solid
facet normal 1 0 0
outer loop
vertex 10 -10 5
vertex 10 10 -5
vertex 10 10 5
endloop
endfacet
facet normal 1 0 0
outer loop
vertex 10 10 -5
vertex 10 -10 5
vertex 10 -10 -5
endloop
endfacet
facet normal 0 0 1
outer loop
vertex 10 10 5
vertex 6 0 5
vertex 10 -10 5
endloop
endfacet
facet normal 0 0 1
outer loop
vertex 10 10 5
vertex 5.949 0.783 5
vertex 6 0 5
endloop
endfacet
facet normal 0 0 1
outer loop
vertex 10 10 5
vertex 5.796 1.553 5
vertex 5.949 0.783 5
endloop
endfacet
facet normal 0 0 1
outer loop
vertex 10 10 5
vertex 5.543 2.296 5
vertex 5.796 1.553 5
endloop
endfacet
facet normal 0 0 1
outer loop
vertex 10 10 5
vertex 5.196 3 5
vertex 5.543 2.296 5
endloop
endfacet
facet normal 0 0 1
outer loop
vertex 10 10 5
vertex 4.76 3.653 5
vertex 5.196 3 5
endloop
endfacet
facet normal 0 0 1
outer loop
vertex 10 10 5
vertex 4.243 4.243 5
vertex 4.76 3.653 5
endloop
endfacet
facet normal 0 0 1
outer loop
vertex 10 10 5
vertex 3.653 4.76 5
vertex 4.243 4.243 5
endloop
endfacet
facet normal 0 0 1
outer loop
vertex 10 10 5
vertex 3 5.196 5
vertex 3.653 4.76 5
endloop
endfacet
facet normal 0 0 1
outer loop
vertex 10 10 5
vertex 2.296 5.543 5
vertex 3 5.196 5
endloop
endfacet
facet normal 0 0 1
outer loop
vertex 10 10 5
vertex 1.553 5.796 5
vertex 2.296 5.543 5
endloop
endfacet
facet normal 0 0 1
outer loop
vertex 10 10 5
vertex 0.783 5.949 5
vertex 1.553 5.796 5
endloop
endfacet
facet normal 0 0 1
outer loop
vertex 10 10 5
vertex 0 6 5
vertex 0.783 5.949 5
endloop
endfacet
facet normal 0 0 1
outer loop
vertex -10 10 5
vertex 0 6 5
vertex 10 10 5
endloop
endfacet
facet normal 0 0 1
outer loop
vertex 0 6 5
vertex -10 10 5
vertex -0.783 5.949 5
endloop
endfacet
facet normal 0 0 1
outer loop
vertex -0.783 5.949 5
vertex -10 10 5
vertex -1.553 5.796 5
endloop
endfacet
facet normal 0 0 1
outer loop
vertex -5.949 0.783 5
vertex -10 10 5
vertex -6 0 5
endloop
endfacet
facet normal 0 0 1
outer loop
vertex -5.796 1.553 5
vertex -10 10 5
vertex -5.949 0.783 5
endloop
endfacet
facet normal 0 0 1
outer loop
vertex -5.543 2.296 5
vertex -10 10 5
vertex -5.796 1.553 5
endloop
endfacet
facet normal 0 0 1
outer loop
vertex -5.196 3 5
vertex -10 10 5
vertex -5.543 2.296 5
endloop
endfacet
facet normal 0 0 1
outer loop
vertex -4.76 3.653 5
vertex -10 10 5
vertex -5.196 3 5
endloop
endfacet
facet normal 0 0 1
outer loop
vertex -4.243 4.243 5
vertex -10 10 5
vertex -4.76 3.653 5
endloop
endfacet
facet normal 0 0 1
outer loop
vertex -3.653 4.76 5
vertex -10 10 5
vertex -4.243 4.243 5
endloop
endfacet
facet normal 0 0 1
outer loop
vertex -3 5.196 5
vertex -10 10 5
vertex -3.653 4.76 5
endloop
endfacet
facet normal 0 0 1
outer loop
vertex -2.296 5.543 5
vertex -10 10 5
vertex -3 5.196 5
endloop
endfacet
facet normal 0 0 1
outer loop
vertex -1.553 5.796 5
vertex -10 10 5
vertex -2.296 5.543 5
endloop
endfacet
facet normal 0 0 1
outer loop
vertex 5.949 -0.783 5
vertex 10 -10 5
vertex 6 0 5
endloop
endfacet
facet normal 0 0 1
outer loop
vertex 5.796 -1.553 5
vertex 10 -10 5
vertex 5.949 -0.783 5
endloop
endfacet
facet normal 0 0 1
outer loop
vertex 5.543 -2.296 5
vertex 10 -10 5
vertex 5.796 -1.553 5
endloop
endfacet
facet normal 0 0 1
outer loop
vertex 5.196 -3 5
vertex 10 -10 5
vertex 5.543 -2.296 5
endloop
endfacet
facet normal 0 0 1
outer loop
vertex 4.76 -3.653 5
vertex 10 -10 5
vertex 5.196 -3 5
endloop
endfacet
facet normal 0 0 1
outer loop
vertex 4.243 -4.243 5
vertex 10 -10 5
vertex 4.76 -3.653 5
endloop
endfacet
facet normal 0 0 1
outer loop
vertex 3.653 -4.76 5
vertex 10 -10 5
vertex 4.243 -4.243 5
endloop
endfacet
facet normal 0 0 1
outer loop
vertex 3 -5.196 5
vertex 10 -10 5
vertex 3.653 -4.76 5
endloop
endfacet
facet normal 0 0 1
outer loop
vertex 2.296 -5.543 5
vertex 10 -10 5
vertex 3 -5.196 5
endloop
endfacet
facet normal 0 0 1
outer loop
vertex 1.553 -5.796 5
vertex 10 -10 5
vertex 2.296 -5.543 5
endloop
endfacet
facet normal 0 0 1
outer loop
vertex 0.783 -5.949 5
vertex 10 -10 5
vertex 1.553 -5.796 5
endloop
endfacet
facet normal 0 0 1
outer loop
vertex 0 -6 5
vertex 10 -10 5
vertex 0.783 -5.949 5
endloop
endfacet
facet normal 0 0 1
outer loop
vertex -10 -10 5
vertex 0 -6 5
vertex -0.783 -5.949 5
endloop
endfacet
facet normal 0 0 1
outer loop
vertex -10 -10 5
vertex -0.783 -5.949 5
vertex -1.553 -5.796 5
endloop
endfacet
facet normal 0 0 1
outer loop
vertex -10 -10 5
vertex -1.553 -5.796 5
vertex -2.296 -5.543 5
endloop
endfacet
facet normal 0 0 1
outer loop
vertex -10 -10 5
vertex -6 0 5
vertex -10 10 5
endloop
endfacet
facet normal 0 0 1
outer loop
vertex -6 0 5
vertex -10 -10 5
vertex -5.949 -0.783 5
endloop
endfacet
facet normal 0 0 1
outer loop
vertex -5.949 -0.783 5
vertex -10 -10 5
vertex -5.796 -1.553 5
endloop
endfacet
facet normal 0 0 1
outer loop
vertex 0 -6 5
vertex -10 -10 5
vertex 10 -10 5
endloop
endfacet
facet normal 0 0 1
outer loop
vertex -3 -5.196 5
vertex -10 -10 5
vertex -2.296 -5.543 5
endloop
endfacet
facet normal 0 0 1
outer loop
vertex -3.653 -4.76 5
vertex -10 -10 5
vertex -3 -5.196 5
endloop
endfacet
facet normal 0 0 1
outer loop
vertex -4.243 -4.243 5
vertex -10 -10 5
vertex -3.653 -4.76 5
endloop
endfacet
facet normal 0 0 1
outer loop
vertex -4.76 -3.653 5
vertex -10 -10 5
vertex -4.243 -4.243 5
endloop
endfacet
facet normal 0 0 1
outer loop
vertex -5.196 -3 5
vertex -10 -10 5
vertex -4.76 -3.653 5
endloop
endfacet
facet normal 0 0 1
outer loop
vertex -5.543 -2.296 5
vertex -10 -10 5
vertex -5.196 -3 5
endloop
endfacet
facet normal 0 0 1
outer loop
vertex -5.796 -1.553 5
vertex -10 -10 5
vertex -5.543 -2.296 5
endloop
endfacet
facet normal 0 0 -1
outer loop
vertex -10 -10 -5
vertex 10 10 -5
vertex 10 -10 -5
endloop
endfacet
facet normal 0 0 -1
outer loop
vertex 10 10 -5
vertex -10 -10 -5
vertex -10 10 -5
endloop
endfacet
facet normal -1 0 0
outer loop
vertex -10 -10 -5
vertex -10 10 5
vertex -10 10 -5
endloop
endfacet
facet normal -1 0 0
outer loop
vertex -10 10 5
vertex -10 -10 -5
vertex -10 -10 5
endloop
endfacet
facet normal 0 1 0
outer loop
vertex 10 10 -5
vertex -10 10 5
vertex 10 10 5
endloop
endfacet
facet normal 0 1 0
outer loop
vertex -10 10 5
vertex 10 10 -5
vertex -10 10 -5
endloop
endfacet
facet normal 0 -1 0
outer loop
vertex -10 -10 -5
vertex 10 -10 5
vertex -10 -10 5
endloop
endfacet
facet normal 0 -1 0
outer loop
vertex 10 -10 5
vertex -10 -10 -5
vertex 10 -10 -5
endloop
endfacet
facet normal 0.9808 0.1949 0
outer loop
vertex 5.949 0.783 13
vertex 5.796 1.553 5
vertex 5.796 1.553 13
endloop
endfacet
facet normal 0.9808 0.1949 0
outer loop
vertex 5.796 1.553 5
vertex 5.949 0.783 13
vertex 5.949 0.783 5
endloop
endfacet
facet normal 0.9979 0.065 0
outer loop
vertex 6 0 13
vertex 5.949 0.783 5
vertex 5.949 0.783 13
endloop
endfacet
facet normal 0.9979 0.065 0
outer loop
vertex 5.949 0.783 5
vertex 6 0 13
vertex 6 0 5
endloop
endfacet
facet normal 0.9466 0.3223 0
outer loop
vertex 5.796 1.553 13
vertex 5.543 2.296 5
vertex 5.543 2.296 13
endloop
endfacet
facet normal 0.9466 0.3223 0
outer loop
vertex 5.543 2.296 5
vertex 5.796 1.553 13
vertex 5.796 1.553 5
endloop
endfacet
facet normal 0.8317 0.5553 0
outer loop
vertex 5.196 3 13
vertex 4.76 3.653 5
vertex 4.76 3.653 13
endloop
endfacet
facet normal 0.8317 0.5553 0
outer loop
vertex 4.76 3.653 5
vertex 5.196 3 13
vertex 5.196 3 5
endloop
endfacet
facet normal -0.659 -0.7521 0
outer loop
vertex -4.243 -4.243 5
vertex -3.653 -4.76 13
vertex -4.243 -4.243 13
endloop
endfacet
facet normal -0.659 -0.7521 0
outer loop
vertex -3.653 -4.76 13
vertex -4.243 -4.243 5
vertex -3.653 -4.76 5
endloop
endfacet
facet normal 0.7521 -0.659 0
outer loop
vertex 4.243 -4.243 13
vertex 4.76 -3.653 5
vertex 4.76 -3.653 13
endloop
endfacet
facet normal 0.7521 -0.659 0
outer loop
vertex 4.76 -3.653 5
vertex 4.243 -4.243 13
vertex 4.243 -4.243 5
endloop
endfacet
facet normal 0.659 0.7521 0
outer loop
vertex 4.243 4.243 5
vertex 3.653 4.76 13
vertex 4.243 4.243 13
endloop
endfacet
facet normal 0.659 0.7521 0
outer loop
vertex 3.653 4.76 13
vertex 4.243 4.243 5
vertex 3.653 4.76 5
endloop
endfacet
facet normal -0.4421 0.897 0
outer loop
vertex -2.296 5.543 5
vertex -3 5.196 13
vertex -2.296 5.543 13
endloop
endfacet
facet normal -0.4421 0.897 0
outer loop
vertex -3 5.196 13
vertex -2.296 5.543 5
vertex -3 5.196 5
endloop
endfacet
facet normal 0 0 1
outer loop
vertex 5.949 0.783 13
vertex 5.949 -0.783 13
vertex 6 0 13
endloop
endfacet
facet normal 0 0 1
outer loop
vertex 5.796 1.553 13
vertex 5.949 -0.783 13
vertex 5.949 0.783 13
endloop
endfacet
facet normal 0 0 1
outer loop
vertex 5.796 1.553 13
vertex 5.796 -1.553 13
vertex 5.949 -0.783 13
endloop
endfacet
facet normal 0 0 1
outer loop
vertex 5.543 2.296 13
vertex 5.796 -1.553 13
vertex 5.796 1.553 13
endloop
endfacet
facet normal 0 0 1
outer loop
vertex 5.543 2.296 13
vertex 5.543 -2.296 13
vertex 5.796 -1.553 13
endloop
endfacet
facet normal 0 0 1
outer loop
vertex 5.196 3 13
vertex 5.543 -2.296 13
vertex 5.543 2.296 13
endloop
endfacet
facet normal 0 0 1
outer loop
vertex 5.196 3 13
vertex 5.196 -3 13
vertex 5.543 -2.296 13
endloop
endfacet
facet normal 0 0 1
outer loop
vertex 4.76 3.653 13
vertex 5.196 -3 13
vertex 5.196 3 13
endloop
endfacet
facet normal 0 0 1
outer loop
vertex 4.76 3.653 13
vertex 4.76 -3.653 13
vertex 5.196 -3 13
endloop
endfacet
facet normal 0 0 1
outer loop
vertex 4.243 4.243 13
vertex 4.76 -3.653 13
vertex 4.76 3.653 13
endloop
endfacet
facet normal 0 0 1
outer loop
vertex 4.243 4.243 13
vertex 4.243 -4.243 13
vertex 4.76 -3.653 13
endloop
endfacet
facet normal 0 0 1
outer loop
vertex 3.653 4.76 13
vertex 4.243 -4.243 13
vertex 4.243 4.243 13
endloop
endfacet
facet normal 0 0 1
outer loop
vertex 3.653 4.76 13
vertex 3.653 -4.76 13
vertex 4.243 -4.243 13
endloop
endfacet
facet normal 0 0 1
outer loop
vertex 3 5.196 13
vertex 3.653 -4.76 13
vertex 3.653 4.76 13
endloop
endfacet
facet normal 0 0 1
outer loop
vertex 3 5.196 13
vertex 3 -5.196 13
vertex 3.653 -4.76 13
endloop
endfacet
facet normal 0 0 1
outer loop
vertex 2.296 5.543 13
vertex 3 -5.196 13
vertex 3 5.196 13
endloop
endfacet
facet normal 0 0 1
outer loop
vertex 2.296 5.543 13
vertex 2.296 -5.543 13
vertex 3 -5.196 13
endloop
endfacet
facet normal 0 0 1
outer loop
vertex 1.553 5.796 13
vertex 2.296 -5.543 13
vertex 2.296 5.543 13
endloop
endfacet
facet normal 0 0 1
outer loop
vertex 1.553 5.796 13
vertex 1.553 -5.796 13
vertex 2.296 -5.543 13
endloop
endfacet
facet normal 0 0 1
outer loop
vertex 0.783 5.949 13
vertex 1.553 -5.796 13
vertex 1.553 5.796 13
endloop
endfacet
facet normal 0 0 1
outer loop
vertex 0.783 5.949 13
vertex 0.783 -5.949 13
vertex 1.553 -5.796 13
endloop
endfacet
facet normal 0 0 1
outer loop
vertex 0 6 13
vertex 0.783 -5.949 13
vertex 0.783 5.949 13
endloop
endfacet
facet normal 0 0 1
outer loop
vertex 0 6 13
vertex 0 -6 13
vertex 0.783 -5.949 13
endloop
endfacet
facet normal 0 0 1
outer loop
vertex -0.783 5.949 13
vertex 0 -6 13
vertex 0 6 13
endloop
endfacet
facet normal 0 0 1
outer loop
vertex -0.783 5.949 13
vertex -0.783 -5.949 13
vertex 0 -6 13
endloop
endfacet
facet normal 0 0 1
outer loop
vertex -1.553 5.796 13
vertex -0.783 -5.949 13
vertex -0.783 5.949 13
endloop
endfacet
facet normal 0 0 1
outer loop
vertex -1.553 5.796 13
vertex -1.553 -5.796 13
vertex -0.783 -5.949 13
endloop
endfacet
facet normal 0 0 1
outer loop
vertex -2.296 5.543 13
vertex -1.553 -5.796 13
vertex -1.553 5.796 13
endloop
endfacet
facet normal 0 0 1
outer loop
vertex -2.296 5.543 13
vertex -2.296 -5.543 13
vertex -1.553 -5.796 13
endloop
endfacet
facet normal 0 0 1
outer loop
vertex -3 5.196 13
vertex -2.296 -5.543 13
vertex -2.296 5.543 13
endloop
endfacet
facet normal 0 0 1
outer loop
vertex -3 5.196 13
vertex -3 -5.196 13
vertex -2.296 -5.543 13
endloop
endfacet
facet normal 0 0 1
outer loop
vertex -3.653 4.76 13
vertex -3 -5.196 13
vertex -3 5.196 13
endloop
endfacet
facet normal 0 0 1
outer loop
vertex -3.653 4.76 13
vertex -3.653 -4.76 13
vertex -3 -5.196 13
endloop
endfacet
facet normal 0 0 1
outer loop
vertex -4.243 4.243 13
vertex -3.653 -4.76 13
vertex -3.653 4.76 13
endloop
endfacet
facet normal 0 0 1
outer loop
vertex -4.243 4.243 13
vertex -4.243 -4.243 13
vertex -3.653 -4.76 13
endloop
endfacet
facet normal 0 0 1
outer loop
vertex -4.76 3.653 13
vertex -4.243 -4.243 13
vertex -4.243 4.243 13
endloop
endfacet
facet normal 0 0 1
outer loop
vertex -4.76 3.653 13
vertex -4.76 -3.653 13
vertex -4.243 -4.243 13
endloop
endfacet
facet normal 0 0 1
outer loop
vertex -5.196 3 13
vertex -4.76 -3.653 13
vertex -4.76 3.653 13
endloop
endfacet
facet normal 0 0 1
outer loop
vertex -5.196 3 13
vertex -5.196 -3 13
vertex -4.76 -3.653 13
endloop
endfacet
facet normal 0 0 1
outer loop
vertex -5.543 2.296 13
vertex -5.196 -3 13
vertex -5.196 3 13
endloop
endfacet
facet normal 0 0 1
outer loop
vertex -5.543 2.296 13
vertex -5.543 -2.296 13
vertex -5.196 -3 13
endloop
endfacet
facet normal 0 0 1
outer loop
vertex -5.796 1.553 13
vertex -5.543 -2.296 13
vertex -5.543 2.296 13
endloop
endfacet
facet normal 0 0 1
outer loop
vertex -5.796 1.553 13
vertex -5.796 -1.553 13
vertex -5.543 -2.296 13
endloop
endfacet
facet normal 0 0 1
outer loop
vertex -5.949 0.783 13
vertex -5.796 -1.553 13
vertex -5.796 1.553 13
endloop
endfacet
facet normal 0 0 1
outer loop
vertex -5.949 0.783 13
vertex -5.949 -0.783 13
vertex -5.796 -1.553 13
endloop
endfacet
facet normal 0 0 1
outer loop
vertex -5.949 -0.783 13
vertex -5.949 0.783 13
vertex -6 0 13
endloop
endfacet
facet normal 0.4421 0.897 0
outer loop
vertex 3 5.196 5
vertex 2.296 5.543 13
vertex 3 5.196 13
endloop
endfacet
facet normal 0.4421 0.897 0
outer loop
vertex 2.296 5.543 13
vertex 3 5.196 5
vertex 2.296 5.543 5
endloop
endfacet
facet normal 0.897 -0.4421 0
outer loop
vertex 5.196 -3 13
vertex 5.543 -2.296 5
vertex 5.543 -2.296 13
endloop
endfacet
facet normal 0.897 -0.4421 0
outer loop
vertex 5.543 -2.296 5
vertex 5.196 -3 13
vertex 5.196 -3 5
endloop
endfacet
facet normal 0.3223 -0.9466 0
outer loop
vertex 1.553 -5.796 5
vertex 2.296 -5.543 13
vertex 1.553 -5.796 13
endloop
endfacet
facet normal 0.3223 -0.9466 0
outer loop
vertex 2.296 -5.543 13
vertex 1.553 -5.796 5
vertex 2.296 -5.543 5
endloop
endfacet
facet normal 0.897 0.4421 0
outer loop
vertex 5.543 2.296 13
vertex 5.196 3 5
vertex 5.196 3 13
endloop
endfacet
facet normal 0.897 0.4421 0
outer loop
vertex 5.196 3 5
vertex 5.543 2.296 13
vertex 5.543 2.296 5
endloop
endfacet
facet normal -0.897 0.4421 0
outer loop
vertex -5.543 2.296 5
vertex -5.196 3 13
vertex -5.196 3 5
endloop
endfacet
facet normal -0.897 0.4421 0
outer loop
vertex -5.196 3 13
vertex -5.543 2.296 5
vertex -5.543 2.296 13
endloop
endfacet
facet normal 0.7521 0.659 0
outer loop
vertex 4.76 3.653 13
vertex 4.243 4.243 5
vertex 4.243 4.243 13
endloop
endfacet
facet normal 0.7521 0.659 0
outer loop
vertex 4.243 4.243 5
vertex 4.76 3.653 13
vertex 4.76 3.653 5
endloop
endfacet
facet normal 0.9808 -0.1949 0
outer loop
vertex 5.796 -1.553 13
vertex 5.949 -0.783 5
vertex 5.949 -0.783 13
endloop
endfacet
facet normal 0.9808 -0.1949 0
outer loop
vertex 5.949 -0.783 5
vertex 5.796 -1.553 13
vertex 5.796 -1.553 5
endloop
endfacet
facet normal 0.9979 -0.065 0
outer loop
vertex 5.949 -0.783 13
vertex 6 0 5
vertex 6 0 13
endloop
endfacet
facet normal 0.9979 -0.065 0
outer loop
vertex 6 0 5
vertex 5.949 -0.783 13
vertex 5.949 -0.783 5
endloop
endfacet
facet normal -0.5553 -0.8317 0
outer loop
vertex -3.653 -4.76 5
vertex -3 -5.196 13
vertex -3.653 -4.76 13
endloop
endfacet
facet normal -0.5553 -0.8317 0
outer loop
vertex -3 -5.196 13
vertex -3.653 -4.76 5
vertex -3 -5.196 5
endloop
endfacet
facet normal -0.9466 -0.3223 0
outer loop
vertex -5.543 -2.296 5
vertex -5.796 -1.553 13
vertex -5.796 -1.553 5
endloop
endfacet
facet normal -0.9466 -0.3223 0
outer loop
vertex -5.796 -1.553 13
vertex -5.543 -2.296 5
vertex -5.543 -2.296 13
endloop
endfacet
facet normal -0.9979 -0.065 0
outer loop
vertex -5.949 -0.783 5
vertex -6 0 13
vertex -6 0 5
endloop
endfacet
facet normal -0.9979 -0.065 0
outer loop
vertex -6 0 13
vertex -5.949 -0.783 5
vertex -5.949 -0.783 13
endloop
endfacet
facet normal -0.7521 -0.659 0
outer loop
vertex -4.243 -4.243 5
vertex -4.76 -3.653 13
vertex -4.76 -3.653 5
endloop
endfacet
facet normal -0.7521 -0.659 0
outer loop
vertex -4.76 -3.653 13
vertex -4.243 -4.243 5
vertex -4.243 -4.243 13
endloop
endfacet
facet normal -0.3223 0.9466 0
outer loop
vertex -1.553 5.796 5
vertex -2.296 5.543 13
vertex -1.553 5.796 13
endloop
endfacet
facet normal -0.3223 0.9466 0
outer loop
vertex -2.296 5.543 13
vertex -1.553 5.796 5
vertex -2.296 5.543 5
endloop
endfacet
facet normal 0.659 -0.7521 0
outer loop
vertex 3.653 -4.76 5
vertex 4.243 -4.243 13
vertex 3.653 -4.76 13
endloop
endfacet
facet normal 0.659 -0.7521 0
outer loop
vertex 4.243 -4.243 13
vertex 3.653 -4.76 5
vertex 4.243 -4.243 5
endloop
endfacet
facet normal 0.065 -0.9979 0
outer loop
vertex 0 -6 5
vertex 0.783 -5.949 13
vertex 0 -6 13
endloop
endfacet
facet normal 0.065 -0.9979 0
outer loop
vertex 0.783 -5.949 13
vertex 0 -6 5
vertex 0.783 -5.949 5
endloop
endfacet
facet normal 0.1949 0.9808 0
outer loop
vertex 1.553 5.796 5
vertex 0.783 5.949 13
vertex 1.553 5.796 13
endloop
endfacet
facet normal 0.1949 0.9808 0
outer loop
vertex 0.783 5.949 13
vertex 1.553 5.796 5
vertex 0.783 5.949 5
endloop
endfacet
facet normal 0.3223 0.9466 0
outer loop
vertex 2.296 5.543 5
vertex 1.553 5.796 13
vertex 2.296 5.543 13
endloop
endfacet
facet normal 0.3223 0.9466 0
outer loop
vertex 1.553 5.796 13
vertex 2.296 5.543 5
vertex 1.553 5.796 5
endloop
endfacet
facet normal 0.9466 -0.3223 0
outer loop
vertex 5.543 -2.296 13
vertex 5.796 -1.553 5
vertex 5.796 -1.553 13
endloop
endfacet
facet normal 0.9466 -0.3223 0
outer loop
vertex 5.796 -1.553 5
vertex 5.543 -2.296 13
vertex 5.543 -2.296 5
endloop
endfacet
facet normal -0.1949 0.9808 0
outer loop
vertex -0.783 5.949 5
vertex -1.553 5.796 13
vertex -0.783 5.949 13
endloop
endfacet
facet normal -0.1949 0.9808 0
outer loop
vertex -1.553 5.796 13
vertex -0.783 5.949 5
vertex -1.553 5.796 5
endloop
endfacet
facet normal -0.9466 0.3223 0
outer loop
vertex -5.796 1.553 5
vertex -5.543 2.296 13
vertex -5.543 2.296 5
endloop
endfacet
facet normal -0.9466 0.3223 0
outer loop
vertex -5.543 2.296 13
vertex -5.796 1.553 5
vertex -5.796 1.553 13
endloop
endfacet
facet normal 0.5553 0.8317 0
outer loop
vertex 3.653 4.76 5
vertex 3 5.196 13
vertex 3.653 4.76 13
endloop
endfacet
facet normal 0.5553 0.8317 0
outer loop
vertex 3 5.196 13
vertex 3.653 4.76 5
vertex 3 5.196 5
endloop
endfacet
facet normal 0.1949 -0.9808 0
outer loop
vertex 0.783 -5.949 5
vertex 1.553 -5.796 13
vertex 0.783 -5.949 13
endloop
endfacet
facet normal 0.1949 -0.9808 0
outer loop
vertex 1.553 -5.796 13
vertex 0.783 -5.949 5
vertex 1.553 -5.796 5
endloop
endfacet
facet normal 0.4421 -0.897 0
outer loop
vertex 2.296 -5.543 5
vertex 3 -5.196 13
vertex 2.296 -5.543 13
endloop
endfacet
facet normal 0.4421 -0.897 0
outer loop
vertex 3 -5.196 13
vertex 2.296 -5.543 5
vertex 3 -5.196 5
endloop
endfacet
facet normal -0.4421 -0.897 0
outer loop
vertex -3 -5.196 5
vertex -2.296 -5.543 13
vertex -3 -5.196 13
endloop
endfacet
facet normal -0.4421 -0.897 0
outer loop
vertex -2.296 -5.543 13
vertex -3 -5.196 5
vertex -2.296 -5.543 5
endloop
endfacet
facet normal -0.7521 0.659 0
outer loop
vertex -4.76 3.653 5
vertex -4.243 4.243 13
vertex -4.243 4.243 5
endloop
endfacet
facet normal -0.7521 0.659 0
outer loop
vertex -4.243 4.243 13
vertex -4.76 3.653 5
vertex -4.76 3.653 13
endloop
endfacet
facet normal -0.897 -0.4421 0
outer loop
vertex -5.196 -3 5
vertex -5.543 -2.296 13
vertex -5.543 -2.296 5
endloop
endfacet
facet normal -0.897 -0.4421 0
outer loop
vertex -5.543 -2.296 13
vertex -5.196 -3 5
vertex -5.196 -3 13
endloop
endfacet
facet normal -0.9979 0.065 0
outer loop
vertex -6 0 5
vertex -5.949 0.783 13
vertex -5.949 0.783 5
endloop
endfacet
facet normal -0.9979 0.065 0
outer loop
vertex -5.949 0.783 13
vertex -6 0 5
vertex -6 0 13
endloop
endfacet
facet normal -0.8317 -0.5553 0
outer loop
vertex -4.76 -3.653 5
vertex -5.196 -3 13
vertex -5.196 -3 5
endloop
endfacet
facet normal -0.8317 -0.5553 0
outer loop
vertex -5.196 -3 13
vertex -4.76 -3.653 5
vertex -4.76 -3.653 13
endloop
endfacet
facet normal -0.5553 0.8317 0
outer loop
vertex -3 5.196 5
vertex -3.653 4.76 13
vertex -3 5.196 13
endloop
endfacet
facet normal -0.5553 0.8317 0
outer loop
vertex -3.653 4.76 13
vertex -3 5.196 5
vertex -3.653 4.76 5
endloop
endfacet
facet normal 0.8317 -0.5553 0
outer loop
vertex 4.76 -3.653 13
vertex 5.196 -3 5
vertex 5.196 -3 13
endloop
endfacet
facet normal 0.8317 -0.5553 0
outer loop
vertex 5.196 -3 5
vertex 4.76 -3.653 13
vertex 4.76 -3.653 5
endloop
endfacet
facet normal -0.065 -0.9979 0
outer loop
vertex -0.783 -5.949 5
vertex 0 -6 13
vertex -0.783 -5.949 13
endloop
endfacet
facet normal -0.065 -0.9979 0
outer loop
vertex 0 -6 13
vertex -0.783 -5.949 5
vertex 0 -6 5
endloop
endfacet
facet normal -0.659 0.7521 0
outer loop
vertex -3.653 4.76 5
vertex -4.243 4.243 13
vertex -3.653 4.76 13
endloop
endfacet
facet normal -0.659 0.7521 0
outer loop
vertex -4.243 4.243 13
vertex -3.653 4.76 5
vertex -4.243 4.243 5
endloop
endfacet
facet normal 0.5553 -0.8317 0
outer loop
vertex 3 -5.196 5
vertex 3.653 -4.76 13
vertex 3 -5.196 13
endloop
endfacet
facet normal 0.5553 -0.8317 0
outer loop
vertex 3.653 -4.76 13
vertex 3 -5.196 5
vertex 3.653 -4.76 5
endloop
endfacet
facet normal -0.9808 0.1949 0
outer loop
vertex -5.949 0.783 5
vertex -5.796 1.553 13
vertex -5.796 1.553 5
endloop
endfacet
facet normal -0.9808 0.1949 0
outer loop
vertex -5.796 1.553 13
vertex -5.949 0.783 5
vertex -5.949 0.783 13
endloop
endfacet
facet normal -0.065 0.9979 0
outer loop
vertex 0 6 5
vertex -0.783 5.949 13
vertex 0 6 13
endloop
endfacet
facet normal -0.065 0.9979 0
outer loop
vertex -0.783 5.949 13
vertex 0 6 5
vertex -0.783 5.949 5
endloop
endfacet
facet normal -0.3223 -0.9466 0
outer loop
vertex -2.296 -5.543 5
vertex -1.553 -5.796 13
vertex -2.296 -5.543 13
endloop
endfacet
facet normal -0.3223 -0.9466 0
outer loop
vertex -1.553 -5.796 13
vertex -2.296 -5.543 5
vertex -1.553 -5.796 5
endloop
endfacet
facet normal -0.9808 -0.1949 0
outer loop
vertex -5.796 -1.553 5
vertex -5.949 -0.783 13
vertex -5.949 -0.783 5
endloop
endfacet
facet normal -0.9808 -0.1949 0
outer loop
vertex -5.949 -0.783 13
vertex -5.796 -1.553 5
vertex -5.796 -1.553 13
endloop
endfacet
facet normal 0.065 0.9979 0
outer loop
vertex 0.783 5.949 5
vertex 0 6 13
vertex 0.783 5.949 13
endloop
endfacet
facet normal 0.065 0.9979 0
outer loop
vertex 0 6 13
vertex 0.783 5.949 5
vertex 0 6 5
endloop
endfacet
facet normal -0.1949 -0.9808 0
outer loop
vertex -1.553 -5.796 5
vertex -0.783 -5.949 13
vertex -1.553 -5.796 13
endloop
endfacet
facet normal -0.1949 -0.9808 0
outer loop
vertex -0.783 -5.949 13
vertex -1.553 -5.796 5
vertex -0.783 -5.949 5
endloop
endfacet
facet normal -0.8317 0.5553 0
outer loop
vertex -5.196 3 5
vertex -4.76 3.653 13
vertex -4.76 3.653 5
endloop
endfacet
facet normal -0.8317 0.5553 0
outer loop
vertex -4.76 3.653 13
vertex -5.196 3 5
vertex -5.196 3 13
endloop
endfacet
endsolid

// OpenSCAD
union() {
    cube([20, 20, 10], center = true);
    translate([0, 0, 5]) cylinder(h = 8, r = 6, $fn = 48, center = false);
}
